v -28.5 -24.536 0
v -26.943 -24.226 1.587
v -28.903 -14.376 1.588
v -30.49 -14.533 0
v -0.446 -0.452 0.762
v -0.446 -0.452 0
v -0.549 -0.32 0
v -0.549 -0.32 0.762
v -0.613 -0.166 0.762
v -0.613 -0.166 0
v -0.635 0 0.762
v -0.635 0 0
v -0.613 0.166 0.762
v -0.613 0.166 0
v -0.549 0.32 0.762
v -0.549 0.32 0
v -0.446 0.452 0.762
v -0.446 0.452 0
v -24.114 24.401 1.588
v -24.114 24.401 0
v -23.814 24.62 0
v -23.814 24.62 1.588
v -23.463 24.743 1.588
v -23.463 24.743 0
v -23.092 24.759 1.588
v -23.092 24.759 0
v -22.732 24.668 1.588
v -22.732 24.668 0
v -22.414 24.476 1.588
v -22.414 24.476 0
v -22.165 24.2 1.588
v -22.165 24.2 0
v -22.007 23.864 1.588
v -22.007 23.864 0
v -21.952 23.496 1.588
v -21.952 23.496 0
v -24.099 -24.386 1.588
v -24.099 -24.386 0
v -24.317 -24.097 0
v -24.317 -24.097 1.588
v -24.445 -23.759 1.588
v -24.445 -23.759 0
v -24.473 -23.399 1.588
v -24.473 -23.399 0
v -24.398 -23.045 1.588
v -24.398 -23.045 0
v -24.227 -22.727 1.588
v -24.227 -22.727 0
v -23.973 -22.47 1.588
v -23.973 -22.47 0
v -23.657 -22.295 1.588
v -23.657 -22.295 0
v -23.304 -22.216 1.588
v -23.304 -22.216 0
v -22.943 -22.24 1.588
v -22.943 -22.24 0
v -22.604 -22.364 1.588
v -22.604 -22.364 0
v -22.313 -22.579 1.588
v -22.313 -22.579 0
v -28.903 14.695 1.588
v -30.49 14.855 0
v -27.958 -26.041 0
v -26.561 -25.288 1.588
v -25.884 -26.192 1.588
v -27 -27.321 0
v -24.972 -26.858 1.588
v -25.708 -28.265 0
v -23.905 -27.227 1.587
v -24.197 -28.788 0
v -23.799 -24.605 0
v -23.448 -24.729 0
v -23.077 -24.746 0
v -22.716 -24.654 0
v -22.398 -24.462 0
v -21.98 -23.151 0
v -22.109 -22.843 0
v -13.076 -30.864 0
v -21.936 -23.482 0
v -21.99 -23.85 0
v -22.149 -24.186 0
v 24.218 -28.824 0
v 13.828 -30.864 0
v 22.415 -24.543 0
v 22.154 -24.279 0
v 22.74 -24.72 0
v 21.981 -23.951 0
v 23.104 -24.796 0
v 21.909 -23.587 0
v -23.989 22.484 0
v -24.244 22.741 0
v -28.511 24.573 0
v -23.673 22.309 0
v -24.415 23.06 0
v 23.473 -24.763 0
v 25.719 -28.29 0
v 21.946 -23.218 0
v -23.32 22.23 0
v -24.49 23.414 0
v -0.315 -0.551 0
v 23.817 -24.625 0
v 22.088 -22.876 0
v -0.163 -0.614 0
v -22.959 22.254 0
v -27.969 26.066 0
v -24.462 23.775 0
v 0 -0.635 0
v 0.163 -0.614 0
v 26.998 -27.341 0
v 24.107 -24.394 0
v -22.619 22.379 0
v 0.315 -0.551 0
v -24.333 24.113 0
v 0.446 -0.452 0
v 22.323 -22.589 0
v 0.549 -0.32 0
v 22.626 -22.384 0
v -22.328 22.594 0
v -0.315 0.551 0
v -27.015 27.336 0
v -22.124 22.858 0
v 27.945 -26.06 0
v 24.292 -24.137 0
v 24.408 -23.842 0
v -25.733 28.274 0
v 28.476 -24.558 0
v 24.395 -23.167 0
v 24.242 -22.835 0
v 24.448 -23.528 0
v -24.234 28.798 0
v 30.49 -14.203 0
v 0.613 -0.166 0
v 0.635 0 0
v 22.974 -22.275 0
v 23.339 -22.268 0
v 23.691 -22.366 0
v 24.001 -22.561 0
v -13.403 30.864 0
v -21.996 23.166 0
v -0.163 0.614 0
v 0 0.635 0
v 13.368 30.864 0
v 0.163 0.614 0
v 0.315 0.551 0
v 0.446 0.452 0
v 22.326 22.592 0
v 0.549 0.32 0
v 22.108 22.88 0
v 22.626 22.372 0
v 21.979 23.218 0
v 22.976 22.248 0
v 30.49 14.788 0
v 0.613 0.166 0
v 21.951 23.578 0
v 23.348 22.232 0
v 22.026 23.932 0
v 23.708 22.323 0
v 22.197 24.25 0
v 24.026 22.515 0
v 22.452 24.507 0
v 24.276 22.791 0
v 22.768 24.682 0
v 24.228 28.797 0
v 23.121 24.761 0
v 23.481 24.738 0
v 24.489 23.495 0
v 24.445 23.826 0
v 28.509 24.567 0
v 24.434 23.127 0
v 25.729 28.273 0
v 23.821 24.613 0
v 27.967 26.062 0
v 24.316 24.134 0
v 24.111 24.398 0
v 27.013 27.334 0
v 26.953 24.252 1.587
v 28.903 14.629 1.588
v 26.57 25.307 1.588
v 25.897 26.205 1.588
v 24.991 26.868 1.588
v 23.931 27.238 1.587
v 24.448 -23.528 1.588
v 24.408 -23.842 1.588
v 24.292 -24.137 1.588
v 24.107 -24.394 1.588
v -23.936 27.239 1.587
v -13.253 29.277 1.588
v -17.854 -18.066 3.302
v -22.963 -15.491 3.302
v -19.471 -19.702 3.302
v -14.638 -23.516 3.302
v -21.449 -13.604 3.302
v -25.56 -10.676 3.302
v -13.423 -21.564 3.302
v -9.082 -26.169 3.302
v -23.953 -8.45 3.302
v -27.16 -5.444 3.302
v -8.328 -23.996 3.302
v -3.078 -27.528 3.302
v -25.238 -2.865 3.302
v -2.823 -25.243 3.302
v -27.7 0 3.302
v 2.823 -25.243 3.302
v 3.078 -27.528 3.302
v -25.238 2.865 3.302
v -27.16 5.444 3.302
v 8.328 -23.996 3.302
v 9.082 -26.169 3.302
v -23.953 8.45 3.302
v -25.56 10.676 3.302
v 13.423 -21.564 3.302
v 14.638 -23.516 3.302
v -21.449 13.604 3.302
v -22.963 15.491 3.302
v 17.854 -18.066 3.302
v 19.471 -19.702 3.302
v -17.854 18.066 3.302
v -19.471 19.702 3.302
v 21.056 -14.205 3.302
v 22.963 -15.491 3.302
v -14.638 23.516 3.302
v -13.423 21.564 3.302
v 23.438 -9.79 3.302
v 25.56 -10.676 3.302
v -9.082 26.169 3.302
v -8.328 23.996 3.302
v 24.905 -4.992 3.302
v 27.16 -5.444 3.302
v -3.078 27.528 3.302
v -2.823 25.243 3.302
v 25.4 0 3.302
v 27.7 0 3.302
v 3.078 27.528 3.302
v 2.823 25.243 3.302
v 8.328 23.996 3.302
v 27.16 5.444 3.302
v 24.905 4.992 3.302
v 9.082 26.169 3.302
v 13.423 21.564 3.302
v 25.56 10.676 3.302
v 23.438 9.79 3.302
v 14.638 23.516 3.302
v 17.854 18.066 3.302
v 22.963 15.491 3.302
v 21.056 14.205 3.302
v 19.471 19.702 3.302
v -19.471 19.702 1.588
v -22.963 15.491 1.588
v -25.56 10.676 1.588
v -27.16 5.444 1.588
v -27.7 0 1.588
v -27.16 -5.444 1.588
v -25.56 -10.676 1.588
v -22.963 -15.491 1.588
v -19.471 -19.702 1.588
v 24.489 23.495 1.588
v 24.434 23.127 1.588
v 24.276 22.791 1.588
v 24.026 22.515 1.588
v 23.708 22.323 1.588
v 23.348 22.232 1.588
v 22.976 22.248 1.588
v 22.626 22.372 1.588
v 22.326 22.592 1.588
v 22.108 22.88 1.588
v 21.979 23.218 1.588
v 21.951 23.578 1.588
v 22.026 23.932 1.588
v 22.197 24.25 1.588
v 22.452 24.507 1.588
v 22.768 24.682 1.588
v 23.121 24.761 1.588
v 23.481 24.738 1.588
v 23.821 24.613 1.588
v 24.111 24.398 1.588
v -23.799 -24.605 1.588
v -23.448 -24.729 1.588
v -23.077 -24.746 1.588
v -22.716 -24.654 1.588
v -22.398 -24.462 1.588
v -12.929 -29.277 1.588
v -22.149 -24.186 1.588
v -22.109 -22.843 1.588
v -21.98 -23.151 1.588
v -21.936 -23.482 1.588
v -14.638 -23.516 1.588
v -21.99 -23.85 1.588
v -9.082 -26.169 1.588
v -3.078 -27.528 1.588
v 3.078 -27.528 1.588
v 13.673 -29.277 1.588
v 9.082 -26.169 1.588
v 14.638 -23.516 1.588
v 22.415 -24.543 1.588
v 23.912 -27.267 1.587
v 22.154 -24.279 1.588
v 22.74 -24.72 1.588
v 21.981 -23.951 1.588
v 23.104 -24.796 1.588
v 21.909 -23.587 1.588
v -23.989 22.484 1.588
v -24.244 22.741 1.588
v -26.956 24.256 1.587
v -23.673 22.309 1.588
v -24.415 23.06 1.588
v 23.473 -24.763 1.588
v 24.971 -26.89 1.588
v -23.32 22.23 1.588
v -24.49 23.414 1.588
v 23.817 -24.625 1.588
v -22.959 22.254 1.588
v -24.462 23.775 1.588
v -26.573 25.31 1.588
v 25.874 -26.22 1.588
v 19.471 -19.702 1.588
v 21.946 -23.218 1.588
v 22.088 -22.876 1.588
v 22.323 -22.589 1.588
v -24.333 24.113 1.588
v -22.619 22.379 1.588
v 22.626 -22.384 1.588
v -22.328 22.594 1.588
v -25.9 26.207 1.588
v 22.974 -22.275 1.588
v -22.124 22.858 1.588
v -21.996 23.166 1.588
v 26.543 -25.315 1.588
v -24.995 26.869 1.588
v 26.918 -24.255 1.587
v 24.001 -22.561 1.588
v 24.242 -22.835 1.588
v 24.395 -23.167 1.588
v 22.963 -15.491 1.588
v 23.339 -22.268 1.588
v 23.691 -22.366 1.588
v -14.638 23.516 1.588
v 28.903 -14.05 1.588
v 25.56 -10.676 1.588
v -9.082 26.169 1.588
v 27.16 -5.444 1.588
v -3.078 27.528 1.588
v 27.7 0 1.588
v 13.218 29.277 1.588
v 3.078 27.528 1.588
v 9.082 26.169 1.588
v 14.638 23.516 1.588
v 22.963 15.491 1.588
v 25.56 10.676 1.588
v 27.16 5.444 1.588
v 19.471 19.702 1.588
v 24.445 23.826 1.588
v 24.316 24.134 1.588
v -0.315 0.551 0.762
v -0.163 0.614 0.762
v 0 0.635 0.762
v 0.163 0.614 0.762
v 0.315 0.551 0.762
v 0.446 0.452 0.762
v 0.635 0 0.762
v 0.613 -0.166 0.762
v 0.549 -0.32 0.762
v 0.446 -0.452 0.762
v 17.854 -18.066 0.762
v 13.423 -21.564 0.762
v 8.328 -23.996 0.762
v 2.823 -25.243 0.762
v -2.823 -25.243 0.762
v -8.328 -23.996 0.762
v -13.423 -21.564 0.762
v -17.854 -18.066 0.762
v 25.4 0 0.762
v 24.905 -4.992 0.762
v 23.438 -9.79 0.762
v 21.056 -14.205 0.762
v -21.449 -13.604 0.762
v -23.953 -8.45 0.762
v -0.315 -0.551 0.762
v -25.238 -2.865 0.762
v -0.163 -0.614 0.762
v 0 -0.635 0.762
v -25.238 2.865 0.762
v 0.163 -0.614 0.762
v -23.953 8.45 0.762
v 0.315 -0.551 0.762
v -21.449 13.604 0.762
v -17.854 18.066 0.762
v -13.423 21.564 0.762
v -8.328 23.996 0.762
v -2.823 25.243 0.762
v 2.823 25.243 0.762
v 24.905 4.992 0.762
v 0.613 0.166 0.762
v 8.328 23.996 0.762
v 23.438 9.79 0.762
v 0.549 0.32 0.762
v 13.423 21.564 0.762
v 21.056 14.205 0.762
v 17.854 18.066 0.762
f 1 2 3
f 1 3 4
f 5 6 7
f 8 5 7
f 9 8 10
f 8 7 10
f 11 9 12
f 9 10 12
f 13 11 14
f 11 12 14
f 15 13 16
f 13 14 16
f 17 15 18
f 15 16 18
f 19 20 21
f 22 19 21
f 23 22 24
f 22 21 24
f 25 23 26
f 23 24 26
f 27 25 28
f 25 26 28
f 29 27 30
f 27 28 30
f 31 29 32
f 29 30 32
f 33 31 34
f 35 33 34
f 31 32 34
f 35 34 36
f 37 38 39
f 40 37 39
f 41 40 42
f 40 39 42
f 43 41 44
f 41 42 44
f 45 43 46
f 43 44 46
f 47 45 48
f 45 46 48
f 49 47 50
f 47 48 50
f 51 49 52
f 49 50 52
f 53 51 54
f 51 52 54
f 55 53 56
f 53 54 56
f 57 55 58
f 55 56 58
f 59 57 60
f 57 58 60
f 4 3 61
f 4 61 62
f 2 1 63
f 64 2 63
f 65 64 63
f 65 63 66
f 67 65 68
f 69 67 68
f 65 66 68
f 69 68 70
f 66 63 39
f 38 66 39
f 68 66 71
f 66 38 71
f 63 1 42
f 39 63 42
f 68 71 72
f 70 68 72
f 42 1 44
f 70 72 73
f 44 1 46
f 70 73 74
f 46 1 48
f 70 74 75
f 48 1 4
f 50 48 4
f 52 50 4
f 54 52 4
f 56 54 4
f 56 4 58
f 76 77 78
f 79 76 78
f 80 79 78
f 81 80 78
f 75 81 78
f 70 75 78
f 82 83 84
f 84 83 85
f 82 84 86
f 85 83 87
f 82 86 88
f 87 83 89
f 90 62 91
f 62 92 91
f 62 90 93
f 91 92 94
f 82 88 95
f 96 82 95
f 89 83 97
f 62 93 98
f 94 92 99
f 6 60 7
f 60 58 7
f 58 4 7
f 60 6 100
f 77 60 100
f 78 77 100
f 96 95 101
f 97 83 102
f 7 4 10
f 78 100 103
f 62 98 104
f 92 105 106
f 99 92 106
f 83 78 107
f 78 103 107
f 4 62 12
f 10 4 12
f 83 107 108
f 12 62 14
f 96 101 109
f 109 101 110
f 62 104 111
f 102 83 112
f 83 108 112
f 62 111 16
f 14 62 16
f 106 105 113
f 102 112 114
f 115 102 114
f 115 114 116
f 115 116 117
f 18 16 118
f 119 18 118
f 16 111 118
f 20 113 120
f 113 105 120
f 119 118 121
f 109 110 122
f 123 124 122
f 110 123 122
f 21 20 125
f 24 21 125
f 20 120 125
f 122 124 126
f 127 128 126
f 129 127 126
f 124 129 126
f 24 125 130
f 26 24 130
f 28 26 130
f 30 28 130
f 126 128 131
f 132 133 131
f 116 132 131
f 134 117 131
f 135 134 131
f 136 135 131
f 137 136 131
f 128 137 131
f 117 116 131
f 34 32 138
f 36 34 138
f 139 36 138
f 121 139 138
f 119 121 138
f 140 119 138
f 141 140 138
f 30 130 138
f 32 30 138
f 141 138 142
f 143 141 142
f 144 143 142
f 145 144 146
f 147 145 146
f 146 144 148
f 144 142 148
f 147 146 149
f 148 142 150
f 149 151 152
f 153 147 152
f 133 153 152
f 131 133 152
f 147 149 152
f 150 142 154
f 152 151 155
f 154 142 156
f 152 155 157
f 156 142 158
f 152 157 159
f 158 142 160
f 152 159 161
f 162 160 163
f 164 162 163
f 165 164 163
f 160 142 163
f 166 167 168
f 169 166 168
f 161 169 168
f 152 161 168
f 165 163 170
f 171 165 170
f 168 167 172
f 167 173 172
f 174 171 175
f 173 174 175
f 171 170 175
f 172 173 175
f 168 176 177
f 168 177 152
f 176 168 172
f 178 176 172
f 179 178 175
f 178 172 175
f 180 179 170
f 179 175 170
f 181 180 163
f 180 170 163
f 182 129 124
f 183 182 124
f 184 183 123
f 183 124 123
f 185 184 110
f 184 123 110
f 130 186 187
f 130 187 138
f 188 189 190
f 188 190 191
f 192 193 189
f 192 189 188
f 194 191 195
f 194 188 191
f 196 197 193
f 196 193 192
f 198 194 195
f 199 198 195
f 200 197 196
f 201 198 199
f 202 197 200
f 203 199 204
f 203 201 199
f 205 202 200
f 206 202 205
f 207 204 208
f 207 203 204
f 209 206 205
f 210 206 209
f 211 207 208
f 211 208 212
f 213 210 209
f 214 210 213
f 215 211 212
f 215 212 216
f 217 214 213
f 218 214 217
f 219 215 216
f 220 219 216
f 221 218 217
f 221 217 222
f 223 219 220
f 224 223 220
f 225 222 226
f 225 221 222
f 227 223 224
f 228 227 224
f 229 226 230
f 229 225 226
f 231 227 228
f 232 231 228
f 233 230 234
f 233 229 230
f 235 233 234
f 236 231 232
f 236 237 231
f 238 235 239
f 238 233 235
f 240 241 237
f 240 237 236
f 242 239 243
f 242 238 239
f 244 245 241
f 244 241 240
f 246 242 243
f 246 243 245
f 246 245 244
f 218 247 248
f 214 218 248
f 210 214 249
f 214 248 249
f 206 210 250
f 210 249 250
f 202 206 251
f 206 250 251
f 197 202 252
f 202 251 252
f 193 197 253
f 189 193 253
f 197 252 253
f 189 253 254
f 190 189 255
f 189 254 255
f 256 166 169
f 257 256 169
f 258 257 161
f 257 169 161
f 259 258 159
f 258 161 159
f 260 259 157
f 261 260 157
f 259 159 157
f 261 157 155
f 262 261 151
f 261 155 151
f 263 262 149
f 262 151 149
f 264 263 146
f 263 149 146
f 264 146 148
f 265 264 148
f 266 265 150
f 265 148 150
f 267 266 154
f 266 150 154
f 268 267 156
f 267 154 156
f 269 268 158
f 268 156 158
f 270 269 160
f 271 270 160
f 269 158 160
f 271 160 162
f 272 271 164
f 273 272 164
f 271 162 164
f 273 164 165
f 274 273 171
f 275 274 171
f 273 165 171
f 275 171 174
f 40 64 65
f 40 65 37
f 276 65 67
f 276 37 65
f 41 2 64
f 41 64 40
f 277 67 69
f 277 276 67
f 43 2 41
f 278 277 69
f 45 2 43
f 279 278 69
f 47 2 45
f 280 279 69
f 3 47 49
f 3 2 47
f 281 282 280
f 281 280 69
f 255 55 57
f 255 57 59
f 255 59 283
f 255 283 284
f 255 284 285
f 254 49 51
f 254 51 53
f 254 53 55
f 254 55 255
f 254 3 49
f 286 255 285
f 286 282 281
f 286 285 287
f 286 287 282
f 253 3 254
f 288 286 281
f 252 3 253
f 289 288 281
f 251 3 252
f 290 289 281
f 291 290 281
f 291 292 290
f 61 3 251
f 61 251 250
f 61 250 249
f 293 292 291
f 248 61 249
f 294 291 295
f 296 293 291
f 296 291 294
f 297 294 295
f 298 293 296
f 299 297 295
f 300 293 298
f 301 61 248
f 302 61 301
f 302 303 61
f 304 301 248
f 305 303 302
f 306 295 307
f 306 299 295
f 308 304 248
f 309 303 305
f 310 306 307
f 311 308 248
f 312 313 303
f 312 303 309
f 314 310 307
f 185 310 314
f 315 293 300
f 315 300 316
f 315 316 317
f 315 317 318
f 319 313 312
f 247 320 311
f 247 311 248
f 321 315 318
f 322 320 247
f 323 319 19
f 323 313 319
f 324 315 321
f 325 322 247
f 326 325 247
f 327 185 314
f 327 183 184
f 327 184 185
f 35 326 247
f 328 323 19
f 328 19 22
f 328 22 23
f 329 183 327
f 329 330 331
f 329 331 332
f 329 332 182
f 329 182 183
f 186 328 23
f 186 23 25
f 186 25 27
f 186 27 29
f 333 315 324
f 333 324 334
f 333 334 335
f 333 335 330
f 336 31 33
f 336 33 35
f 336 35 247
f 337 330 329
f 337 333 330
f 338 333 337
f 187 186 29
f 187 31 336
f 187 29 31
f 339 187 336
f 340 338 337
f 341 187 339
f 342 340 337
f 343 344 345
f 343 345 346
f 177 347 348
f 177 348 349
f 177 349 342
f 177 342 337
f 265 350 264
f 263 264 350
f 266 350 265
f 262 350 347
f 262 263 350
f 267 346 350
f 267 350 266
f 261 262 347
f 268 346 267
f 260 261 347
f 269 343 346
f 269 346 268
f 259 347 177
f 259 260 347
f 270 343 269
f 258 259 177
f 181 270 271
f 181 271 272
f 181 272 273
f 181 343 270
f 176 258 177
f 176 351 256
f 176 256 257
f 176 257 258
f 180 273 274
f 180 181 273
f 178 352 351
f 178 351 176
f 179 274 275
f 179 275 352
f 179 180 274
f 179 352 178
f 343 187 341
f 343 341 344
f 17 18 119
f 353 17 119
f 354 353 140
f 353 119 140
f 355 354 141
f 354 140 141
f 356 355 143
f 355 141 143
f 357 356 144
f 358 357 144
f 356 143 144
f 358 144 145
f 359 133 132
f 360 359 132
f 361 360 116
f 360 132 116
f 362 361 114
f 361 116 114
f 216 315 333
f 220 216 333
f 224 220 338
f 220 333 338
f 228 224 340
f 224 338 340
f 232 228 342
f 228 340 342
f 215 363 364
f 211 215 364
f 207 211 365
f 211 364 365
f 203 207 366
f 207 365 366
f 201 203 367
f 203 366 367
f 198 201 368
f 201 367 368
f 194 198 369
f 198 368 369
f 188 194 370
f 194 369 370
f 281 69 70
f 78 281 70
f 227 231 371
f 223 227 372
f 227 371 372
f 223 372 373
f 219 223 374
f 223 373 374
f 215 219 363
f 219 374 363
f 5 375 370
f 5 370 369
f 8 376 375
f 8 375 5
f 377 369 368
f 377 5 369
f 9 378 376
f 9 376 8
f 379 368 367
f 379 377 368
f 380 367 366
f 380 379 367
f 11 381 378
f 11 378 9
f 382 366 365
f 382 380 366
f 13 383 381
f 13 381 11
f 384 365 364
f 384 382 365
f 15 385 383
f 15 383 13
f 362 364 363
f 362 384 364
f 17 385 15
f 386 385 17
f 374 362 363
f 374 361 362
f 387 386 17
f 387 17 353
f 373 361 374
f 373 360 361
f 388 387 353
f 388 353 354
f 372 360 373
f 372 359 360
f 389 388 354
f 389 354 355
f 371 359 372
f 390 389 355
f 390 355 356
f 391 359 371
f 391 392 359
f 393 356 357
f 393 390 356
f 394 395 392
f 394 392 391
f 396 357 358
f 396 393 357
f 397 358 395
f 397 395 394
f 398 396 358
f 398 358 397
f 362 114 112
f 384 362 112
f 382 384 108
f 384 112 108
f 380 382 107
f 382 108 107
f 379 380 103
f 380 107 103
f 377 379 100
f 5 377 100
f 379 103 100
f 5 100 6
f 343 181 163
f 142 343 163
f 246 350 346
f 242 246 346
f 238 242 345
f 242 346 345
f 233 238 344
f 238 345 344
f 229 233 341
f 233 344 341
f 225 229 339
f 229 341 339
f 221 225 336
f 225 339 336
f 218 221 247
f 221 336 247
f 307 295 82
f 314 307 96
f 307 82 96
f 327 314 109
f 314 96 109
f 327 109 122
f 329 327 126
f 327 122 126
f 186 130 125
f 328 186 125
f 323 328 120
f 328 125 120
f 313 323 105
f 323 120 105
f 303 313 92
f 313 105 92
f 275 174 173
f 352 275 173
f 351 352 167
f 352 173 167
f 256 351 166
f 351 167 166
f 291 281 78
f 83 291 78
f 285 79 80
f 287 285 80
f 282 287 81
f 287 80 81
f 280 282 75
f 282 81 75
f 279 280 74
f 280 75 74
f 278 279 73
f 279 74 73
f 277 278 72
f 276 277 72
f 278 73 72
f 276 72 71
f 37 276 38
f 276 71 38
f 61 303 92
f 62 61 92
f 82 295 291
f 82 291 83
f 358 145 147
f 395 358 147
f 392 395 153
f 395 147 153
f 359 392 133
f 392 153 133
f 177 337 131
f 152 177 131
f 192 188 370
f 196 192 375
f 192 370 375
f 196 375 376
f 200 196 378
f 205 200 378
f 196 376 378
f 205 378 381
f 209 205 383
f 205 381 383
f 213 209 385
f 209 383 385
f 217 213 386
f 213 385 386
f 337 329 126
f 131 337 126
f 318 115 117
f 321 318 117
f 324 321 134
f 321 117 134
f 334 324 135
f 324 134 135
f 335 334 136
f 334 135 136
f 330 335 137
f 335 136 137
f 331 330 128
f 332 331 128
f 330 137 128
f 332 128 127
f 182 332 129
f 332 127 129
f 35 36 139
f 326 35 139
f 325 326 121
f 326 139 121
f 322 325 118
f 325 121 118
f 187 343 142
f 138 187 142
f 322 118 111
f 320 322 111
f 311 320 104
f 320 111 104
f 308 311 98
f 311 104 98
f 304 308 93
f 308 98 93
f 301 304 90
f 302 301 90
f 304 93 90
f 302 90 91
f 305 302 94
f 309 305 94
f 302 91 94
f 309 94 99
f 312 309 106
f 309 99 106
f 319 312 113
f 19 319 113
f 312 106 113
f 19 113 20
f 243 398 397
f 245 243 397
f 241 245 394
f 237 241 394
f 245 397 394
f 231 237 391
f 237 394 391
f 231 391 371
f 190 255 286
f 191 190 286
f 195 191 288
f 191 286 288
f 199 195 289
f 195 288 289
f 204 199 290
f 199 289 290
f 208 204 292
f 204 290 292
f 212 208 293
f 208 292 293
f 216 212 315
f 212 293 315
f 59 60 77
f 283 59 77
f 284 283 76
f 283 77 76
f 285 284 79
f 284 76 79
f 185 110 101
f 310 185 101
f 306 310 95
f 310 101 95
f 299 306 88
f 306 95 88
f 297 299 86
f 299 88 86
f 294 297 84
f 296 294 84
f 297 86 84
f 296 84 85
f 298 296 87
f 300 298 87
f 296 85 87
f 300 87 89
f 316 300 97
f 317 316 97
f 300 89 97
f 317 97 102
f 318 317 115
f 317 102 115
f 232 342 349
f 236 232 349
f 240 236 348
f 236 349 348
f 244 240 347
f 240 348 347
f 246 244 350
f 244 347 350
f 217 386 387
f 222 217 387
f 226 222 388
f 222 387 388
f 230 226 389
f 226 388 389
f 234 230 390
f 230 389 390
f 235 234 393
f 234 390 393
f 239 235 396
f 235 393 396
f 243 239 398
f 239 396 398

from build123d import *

# Parameters (mm, degrees)
F1_DEPTH     = 0.762
F2_DEPTH     = 3.302
F3_DEPTH     = 1.5875
F4_T1_DEPTH  = 68.7698589568
F4_T3_DEPTH  = 29.8890950425
F4_T5_DEPTH  = 30.9975051116
F4_T7_DEPTH  = 66.2764134385
F4_T9_DEPTH  = 29.6095967996
F4_T11_DEPTH = 30.7124717043
F4_T13_DEPTH = 66.1433332478
F4_T15_DEPTH = 30.7409380137
F4_T17_DEPTH = 29.6692094887
F4_T19_DEPTH = 68.3706865963
F4_T21_DEPTH = 30.237608237
F4_T23_DEPTH = 30.2773753002
F4_T26_ANGLE = 67.887600788
F4_T28_ANGLE = 67.7694142572
F4_T30_ANGLE = 67.6911456036
F4_T32_ANGLE = 68.1706761996


# Not quite as in the source:
# - a fillet or chamfer that OpenCascade refuses, or shapes differently, is made with other operations: its cross-section is extruded or revolved along the edge and cut away or added


with BuildPart() as f1:
    # F0 (on Top) → F1 (new body)
    with BuildSketch(Plane.XY):
        with BuildLine():
            Line((0.4463481019, 0.4516617893), (17.8539240764, 18.0664715723))
            ThreePointArc((17.8539240764, 18.0664715723), (0, 25.4), (-17.8539240764, 18.0664715723))
            Line((-17.8539240764, 18.0664715723), (-0.4463481019, 0.4516617893))
            ThreePointArc((-0.4463481019, 0.4516617893), (0, 0.635), (0.4463481019, 0.4516617893))
        make_face()
        with BuildLine():
            Line((-0.4463481019, 0.4516617893), (-17.8539240764, 18.0664715723))
            ThreePointArc((-17.8539240764, 18.0664715723), (-25.4, 0), (-17.8539240764, -18.0664715723))
            Line((-17.8539240764, -18.0664715723), (-0.4463481019, -0.4516617893))
            ThreePointArc((-0.4463481019, -0.4516617893), (-0.635, 0), (-0.4463481019, 0.4516617893))
        make_face()
        with BuildLine():
            ThreePointArc((-17.8539240764, -18.0664715723), (0, -25.4), (17.8539240764, -18.0664715723))
            Line((17.8539240764, -18.0664715723), (0.4463481019, -0.4516617893))
            ThreePointArc((0.4463481019, -0.4516617893), (0, -0.635), (-0.4463481019, -0.4516617893))
            Line((-0.4463481019, -0.4516617893), (-17.8539240764, -18.0664715723))
        make_face()
        with BuildLine():
            ThreePointArc((17.8539240764, -18.0664715723), (23.4376798291, -9.789543617), (25.4, 0))
            ThreePointArc((25.4, 0), (23.4376798291, 9.789543617), (17.8539240764, 18.0664715723))
            Line((17.8539240764, 18.0664715723), (0.4463481019, 0.4516617893))
            ThreePointArc((0.4463481019, 0.4516617893), (0.5859419957, 0.2447385904), (0.635, 0))
            ThreePointArc((0.635, 0), (0.5859419957, -0.2447385904), (0.4463481019, -0.4516617893))
            Line((0.4463481019, -0.4516617893), (17.8539240764, -18.0664715723))
        make_face()
    extrude(amount=F1_DEPTH)

    # F0 (on Top) → F2 (join)
    with BuildSketch(Plane.XY):
        with BuildLine():
            ThreePointArc((-17.8539240764, 18.0664715723), (0, 25.4), (17.8539240764, 18.0664715723))
            Line((17.8539240764, 18.0664715723), (19.4706182402, 19.7024121658))
            ThreePointArc((19.4706182402, 19.7024121658), (0, 27.7000003576), (-19.4706182402, 19.7024121658))
            Line((-19.4706182402, 19.7024121658), (-17.8539240764, 18.0664715723))
        make_face()
        with BuildLine():
            ThreePointArc((-17.8539240764, -18.0664715723), (-25.4, 0), (-17.8539240764, 18.0664715723))
            Line((-17.8539240764, 18.0664715723), (-19.4706182402, 19.7024121658))
            ThreePointArc((-19.4706182402, 19.7024121658), (-27.7000003576, 0), (-19.4706182402, -19.7024121658))
            Line((-19.4706182402, -19.7024121658), (-17.8539240764, -18.0664715723))
        make_face()
        with BuildLine():
            Line((19.4706182402, -19.7024121658), (17.8539240764, -18.0664715723))
            ThreePointArc((17.8539240764, -18.0664715723), (0, -25.4), (-17.8539240764, -18.0664715723))
            Line((-17.8539240764, -18.0664715723), (-19.4706182402, -19.7024121658))
            ThreePointArc((-19.4706182402, -19.7024121658), (0, -27.7000003576), (19.4706182402, -19.7024121658))
        make_face()
        with BuildLine():
            ThreePointArc((17.8539240764, 18.0664715723), (23.4376798291, 9.789543617), (25.4, 0))
            ThreePointArc((25.4, 0), (23.4376798291, -9.789543617), (17.8539240764, -18.0664715723))
            Line((17.8539240764, -18.0664715723), (19.4706182402, -19.7024121658))
            ThreePointArc((19.4706182402, -19.7024121658), (25.5599897498, -10.6759984918), (27.7000003576, 0))
            ThreePointArc((27.7000003576, 0), (25.5599897498, 10.6759984918), (19.4706182402, 19.7024121658))
            Line((19.4706182402, 19.7024121658), (17.8539240764, 18.0664715723))
        make_face()
    extrude(amount=F2_DEPTH)

    # F0 (on Top) → F3 (join)
    with BuildSketch(Plane.XY):
        with BuildLine():
            ThreePointArc((-19.4706182402, 19.7024121658), (0, 27.7000003576), (19.4706182402, 19.7024121658))
            Line((19.4706182402, 19.7024121658), (22.3259415659, 22.5917275607))
            ThreePointArc((22.3259415659, 22.5917275607), (22.3153141911, 24.3877473432), (24.1113339735, 24.398374718))
            Line((24.1113339735, 24.398374718), (26.7918864226, 27.1108386229))
            Line((26.7918864226, 27.1108386229), (27.6821187888, 28.0116690324))
            ThreePointArc((27.6821187888, 28.0116690324), (26.1722118102, 29.1163410613), (24.4059253481, 29.7330675073))
            Line((24.4059253481, 29.7330675073), (13.4577511535, 31.8168438971))
            Line((13.4577511535, 31.8168438971), (-13.4931333577, 31.8168438971))
            Line((-13.4931333577, 31.8168438971), (-24.4124478948, 29.7336912681))
            ThreePointArc((-24.4124478948, 29.7336912681), (-26.1764044214, 29.1172901956), (-27.6845826781, 28.0141622538))
            Line((-27.6845826781, 28.0141622538), (-26.7918864226, 27.1108386229))
            Line((-26.7918864226, 27.1108386229), (-24.1137970362, 24.4008671029))
            ThreePointArc((-24.1137970362, 24.4008671029), (-22.7321077122, 24.6676976509), (-21.952476244, 23.4961863607))
            ThreePointArc((-21.952476244, 23.4961863607), (-22.0502202295, 23.007600814), (-22.328406695, 22.5942220368))
            Line((-22.328406695, 22.5942220368), (-19.4706182402, 19.7024121658))
        make_face()
        with BuildLine():
            ThreePointArc((-19.4706182402, -19.7024121658), (-27.7000003576, 0), (-19.4706182402, 19.7024121658))
            Line((-19.4706182402, 19.7024121658), (-22.328406695, 22.5942220368))
            ThreePointArc((-22.328406695, 22.5942220368), (-24.1257998226, 22.6034901569), (-24.1137970362, 24.4008671029))
            Line((-24.1137970362, 24.4008671029), (-26.7918864226, 27.1108386229))
            Line((-26.7918864226, 27.1108386229), (-27.6845826781, 28.0141622538))
            ThreePointArc((-27.6845826781, 28.0141622538), (-28.806546627, 26.5195384668), (-29.4448227731, 24.7630342884))
            Line((-29.4448227731, 24.7630342884), (-31.4425267279, 14.9509597699))
            Line((-31.4425267279, 14.9509597699), (-31.4425267279, -14.6264504503))
            Line((-31.4425267279, -14.6264504503), (-29.4338375739, -24.7214172456))
            ThreePointArc((-29.4338375739, -24.7214172456), (-28.7971534061, -26.4922974633), (-27.669411804, -27.9988107734))
            Line((-27.669411804, -27.9988107734), (-26.7918864226, -27.1108386229))
            Line((-26.7918864226, -27.1108386229), (-24.0986269887, -24.385516459))
            ThreePointArc((-24.0986269887, -24.385516459), (-24.1092543635, -22.5894966765), (-22.3132345811, -22.5788693018))
            Line((-22.3132345811, -22.5788693018), (-19.4706182402, -19.7024121658))
        make_face()
        with BuildLine():
            Line((22.3230898006, -22.5888418457), (19.4706182402, -19.7024121658))
            ThreePointArc((19.4706182402, -19.7024121658), (0, -27.7000003576), (-19.4706182402, -19.7024121658))
            Line((-19.4706182402, -19.7024121658), (-22.3132345811, -22.5788693018))
            ThreePointArc((-22.3132345811, -22.5788693018), (-22.0340467935, -22.9927156995), (-21.9359307849, -23.4821928804))
            ThreePointArc((-21.9359307849, -23.4821928804), (-22.7164536041, -24.6540768718), (-24.0986269887, -24.385516459))
            Line((-24.0986269887, -24.385516459), (-26.7918864226, -27.1108386229))
            Line((-26.7918864226, -27.1108386229), (-27.669411804, -27.9988107734))
            ThreePointArc((-27.669411804, -27.9988107734), (-26.1496583495, -29.1086454062), (-24.3713676477, -29.724328486))
            Line((-24.3713676477, -29.724328486), (-13.163754974, -31.8168438971))
            Line((-13.163754974, -31.8168438971), (13.9202097279, -31.8168438971))
            Line((13.9202097279, -31.8168438971), (24.4012740355, -29.7591081974))
            ThreePointArc((24.4012740355, -29.7591081974), (26.1707747188, -29.1285461533), (27.6783635387, -28.0078690768))
            Line((27.6783635387, -28.0078690768), (26.7918864226, -27.1108386229))
            Line((26.7918864226, -27.1108386229), (24.1069762986, -24.3939651657))
            ThreePointArc((24.1069762986, -24.3939651657), (22.2746158391, -24.4207569441), (22.3230898006, -22.5888418457))
        make_face()
        with BuildLine():
            Line((22.3259415659, 22.5917275607), (19.4706182402, 19.7024121658))
            ThreePointArc((19.4706182402, 19.7024121658), (25.5599897498, 10.6759984918), (27.7000003576, 0))
            ThreePointArc((27.7000003576, 0), (25.5599897498, -10.6759984918), (19.4706182402, -19.7024121658))
            Line((19.4706182402, -19.7024121658), (22.3230898006, -22.5888418457))
            ThreePointArc((22.3230898006, -22.5888418457), (23.6913792809, -22.3664758287), (24.4479394177, -23.5280607403))
            ThreePointArc((24.4479394177, -23.5280607403), (24.3596282174, -23.9933687895), (24.1069762986, -24.3939651657))
            Line((24.1069762986, -24.3939651657), (26.7918864226, -27.1108386229))
            Line((26.7918864226, -27.1108386229), (27.6783635387, -28.0078690768))
            ThreePointArc((27.6783635387, -28.0078690768), (28.7879487003, -26.5030054203), (29.411169277, -24.7402263734))
            Line((29.411169277, -24.7402263734), (31.4425267279, -14.2945268971))
            Line((31.4425267279, -14.2945268971), (31.4425267279, 14.8837109626))
            Line((31.4425267279, 14.8837109626), (29.4421670292, 24.7560759433))
            ThreePointArc((29.4421670292, 24.7560759433), (28.8045816259, 26.5149404148), (27.6821187888, 28.0116690324))
            Line((27.6821187888, 28.0116690324), (26.7918864226, 27.1108386229))
            Line((26.7918864226, 27.1108386229), (24.1113339735, 24.398374718))
            ThreePointArc((24.1113339735, 24.398374718), (24.3905217612, 23.9845283202), (24.4886377697, 23.4950511393))
            ThreePointArc((24.4886377697, 23.4950511393), (23.7081149506, 22.3231671479), (22.3259415659, 22.5917275607))
        make_face()
    extrude(amount=F3_DEPTH)

    # F4: chamfer of 2.54 on 12 edges, made by hand

    # F4_s2 → F4_t1 (cut)
    with BuildSketch(Plane.XZ.offset(-34.5471841382)):
        Polygon((-28.9025267279, 1.5875), (-31.4425267279, -0.9525), (-31.4425267279, 1.5875), align=None)
    extrude(amount=F4_T1_DEPTH, mode=Mode.SUBTRACT)

    # F4_s4 → F4_t3 (cut)
    with BuildSketch(Plane(origin=(-2.2222353061, 11.168174818, 0), x_dir=(0, 0, 1), z_dir=(0.1951534433, -0.9807727227, 0))):
        Polygon((1.5875, 31.1523747161), (-0.9525, 33.6923747161), (1.5875, 33.6923747161), align=None)
    extrude(amount=F4_T3_DEPTH, mode=Mode.SUBTRACT)

    # F4_s6 → F4_t5 (cut)
    with BuildSketch(Plane(origin=(-18.1876927678, 3.3957300736, 0), x_dir=(0, 0, 1), z_dir=(0.9830134812, -0.1835333642, 0))):
        Polygon((1.5875, 31.1523747161), (-0.9525, 33.6923747161), (1.5875, 33.6923747161), align=None)
    extrude(amount=F4_T5_DEPTH, mode=Mode.SUBTRACT)

    # F4_s8 → F4_t7 (cut)
    with BuildSketch(Plane.YZ.offset(-32.7599793423)):
        Polygon((-29.2768438971, 1.5875), (-31.8168438971, -0.9525), (-31.8168438971, 1.5875), align=None)
    extrude(amount=F4_T7_DEPTH, mode=Mode.SUBTRACT)

    # F4_s10 → F4_t9 (cut)
    with BuildSketch(Plane(origin=(3.6690463267, 18.0211666908, 0), x_dir=(0, 0, 1), z_dir=(-0.1995036107, -0.9798970912, 0))):
        Polygon((1.5875, 31.2532109374), (-0.9525, 33.7932109374), (1.5875, 33.7932109374), align=None)
    extrude(amount=F4_T9_DEPTH, mode=Mode.SUBTRACT)

    # F4_s12 → F4_t11 (cut)
    with BuildSketch(Plane(origin=(12.0865328675, 2.3058308864, 0), x_dir=(0, 0, 1), z_dir=(-0.9822842374, -0.1873971104, 0))):
        Polygon((1.5875, 31.2417584447), (-0.9525, 33.7817584447), (1.5875, 33.7817584447), align=None)
    extrude(amount=F4_T11_DEPTH, mode=Mode.SUBTRACT)

    # F4_s14 → F4_t13 (cut)
    with BuildSketch(Plane.YZ.offset(-33.089357726)):
        Polygon((29.2768438971, 1.5875), (31.8168438971, -0.9525), (31.8168438971, 1.5875), align=None)
    extrude(amount=F4_T13_DEPTH, mode=Mode.SUBTRACT)

    # F4_s16 → F4_t15 (cut)
    with BuildSketch(Plane(origin=(18.0914247696, -3.4433580544, 0), x_dir=(0, 0, 1), z_dir=(-0.9823647823, 0.1869744218, 0))):
        Polygon((1.5875, 31.2320021705), (-0.9525, 33.7720021705), (1.5875, 33.7720021705), align=None)
    extrude(amount=F4_T15_DEPTH, mode=Mode.SUBTRACT)

    # F4_s18 → F4_t17 (cut)
    with BuildSketch(Plane(origin=(2.2346970165, -11.0288887457, 0), x_dir=(0, 0, 1), z_dir=(-0.1985865833, 0.980083348, 0))):
        Polygon((1.5875, 31.2320021705), (-0.9525, 33.7720021705), (1.5875, 33.7720021705), align=None)
    extrude(amount=F4_T17_DEPTH, mode=Mode.SUBTRACT)

    # F4_s20 → F4_t19 (cut)
    with BuildSketch(Plane.XZ.offset(-34.4799353309)):
        Polygon((28.9025267279, 1.5875), (31.4425267279, -0.9525), (31.4425267279, 1.5875), align=None)
    extrude(amount=F4_T19_DEPTH, mode=Mode.SUBTRACT)

    # F4_s22 → F4_t21 (cut)
    with BuildSketch(Plane(origin=(-3.5641324861, -18.3275753981, 0), x_dir=(0, 0, 1), z_dir=(0.1908922257, 0.9816110015, 0))):
        Polygon((1.5875, 31.053044204), (-0.9525, 33.593044204), (1.5875, 33.593044204), align=None)
    extrude(amount=F4_T21_DEPTH, mode=Mode.SUBTRACT)

    # F4_s24 → F4_t23 (cut)
    with BuildSketch(Plane(origin=(-11.8402934583, -2.3245916472, 0), x_dir=(0, 0, 1), z_dir=(0.9812673161, 0.1926511209, 0))):
        Polygon((1.5875, 31.3625730245), (-0.9525, 33.9025730245), (1.5875, 33.9025730245), align=None)
    extrude(amount=F4_T23_DEPTH, mode=Mode.SUBTRACT)

    # F4_s25 → F4_t26 (revolve, cut)
    with BuildSketch(Plane(origin=(17.8699053405, 3.5083786426, 0), x_dir=(0, 0, 1), z_dir=(-0.9812673161, -0.1926511209, 0))):
        Polygon((1.5875, -31.3625730245), (-0.9525, -33.9025730245), (1.5875, -33.9025730245), align=None)
    revolve(axis=Axis((23.1779394177, -23.5280607403, 1.5875), (0, 0, 1)), revolution_arc=F4_T26_ANGLE, mode=Mode.SUBTRACT)

    # F4_s27 → F4_t28 (revolve, cut)
    with BuildSketch(Plane(origin=(-3.6572099251, 18.0494094211, 0), x_dir=(0, 0, 1), z_dir=(0.1985865833, -0.980083348, 0))):
        Polygon((1.5875, -31.2320021705), (-0.9525, -33.7720021705), (1.5875, -33.7720021705), align=None)
    revolve(axis=Axis((23.2186377697, 23.4950511393, 1.5875), (0, 0, 1)), revolution_arc=F4_T28_ANGLE, mode=Mode.SUBTRACT)

    # F4_s29 → F4_t30 (revolve, cut)
    with BuildSketch(Plane(origin=(-18.081843979, -3.4495975634, 0), x_dir=(0, 0, 1), z_dir=(0.9822842374, 0.1873971104, 0))):
        Polygon((1.5875, -31.2417584447), (-0.9525, -33.7817584447), (1.5875, -33.7817584447), align=None)
    revolve(axis=Axis((-23.222476244, 23.4961863607, 1.5875), (0, 0, 1)), revolution_arc=F4_T30_ANGLE, mode=Mode.SUBTRACT)

    # F4_s31 → F4_t32 (revolve, cut)
    with BuildSketch(Plane(origin=(3.6107245099, -18.1462343053, 0), x_dir=(0, 0, 1), z_dir=(-0.1951534433, 0.9807727227, 0))):
        Polygon((1.5875, -31.1523747161), (-0.9525, -33.6923747161), (1.5875, -33.6923747161), align=None)
    revolve(axis=Axis((-23.2059307849, -23.4821928804, 1.5875), (0, 0, 1)), revolution_arc=F4_T32_ANGLE, mode=Mode.SUBTRACT)


solid = f1.part
